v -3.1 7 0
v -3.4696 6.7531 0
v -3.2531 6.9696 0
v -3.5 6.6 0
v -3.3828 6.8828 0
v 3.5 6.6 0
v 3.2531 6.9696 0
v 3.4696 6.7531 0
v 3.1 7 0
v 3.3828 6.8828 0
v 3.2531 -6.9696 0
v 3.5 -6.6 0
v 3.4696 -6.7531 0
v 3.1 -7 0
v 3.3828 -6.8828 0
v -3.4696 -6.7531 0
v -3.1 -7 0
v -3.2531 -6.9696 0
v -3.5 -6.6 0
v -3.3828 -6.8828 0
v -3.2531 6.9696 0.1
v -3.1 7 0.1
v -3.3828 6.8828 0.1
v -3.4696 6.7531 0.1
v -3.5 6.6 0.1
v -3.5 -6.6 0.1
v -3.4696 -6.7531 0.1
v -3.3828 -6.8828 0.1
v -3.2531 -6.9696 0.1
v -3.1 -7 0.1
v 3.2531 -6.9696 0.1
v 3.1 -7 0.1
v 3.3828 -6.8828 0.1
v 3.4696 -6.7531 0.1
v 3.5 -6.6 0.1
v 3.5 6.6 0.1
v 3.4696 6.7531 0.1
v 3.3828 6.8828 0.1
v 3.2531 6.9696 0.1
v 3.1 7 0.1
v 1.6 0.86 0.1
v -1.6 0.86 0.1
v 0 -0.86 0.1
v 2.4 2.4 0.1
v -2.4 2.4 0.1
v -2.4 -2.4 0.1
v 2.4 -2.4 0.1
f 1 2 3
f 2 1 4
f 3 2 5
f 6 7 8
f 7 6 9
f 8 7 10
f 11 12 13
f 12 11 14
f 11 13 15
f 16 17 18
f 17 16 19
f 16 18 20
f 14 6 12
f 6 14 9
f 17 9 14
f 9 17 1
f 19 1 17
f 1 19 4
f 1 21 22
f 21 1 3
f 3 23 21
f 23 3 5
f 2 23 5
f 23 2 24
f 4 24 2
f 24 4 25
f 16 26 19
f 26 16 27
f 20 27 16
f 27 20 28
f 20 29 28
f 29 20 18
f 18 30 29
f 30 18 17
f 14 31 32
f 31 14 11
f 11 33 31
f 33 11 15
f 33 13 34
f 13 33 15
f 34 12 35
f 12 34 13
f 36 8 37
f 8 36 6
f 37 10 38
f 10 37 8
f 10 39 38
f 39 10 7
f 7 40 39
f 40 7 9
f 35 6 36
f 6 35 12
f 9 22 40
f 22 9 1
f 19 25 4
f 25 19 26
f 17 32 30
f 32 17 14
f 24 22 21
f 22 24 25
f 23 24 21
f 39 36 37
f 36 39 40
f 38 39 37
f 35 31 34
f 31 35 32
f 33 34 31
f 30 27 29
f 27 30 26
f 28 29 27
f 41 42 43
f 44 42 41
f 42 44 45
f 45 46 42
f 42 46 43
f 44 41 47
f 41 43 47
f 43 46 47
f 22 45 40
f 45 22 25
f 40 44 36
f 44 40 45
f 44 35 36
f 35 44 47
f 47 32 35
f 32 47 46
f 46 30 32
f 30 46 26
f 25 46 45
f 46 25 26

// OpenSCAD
// file: ../p/1-4cyli.scad
use <../lib.scad>
function ldraw_lib__1_4cyli() = [
// 0 Cylinder 0.25
// 0 Name: 1-4cyli.dat
// 0 Author: James Jessiman
// 0 !LDRAW_ORG Primitive UPDATE 2012-01
// 0 !LICENSE Licensed under CC BY 4.0 : see CAreadme.txt
// 
// 0 BFC CERTIFY CCW
  [0,"BFC","CERTIFY"],
  [0,"BFC","CCW"],
// 
// 0 !HISTORY 2002-03-23 [sbliss] Added BFC statement.
// 0 !HISTORY 2002-04-25 [PTadmin] Official Update 2002-02
// 0 !HISTORY 2007-06-22 [PTadmin] Header formatted for Contributor Agreement
// 0 !HISTORY 2008-07-01 [PTadmin] Official Update 2008-01
// 0 !HISTORY 2012-02-16 [Philo] Changed to CCW
// 0 !HISTORY 2012-03-30 [PTadmin] Official Update 2012-01
// 
// 
// 4 16 1 1 0 0.9239 1 0.3827 0.9239 0 0.3827 1 0 0
  [4,16,1,1,0,0.9239,1,0.3827,0.9239,0,0.3827,1,0,0],
// 5 24 1 0 0 1 1 0 0.9239 0 0.3827 1 0 -1
  [5,24,1,0,0,1,1,0,0.9239,0,0.3827,1,0,-1],
// 4 16 0.9239 1 0.3827 0.7071 1 0.7071 0.7071 0 0.7071 0.9239 0 0.3827
  [4,16,0.9239,1,0.3827,0.7071,1,0.7071,0.7071,0,0.7071,0.9239,0,0.3827],
// 5 24 0.9239 0 0.3827 0.9239 1 0.3827 0.7071 0 0.7071 1 0 0
  [5,24,0.9239,0,0.3827,0.9239,1,0.3827,0.7071,0,0.7071,1,0,0],
// 4 16 0.7071 1 0.7071 0.3827 1 0.9239 0.3827 0 0.9239 0.7071 0 0.7071
  [4,16,0.7071,1,0.7071,0.3827,1,0.9239,0.3827,0,0.9239,0.7071,0,0.7071],
// 5 24 0.7071 0 0.7071 0.7071 1 0.7071 0.3827 0 0.9239 0.9239 0 0.3827
  [5,24,0.7071,0,0.7071,0.7071,1,0.7071,0.3827,0,0.9239,0.9239,0,0.3827],
// 4 16 0.3827 1 0.9239 0 1 1 0 0 1 0.3827 0 0.9239
  [4,16,0.3827,1,0.9239,0,1,1,0,0,1,0.3827,0,0.9239],
// 5 24 0.3827 0 0.9239 0.3827 1 0.9239 0 0 1 0.7071 0 0.7071
  [5,24,0.3827,0,0.9239,0.3827,1,0.9239,0,0,1,0.7071,0,0.7071],
// 5 24 0 0 1 0 1 1 0.3827 0 0.9239 -1 0 1
  [5,24,0,0,1,0,1,1,0.3827,0,0.9239,-1,0,1],
];
module ldraw_lib__1_4cyli(step=0, col=false, unit=2/5, alt=false, line=0.2, solid=!$preview)
    makepoly(ldraw_lib__1_4cyli(), step=step, col=col, unit=unit, alt=alt, line=line, solid=solid);
ldraw_lib__1_4cyli(line=0.2);
// file: ../p/1-4chrd.scad
use <../lib.scad>
function ldraw_lib__1_4chrd() = [
// 0 Chord 0.25
// 0 Name: 1-4chrd.dat
// 0 Author: Max Martin Richter [MMR1988]
// 0 !LDRAW_ORG Primitive UPDATE 2023-05
// 0 !LICENSE Licensed under CC BY 4.0 : see CAreadme.txt
// 
// 0 BFC CERTIFY CCW
  [0,"BFC","CERTIFY"],
  [0,"BFC","CCW"],
// 
// 0 !HISTORY 2004-04-22 [PTadmin] Official Update 2004-02
// 0 !HISTORY 2007-10-09 [PTadmin] Header formatted for Contributor Agreement
// 0 !HISTORY 2008-07-01 [PTadmin] Official Update 2008-01
// 0 !HISTORY 2012-08-02 [MMR1988] Re-creation with PrimGen2 and Rectifier
// 0 !HISTORY 2012-08-09 [PTadmin] Official Update 2012-02
// 0 !HISTORY 2023-10-27 [OrionP] Change author to MMR1988 from hafhead
// 0 !HISTORY 2023-10-31 [OrionP] Official Update 2023-05
// 
// 4 16 0.9239 0 0.3827 0.3827 0 0.9239 0 0 1 1 0 0
  [4,16,0.9239,0,0.3827,0.3827,0,0.9239,0,0,1,1,0,0],
// 3 16 0.7071 0 0.7071 0.3827 0 0.9239 0.9239 0 0.3827
  [3,16,0.7071,0,0.7071,0.3827,0,0.9239,0.9239,0,0.3827],
];
module ldraw_lib__1_4chrd(step=0, col=false, unit=2/5, alt=false, line=0.2, solid=!$preview)
    makepoly(ldraw_lib__1_4chrd(), step=step, col=col, unit=unit, alt=alt, line=line, solid=solid);
ldraw_lib__1_4chrd(line=0.2);
// main file
use <../lib.scad>
use <../p/1-4chrd.scad>
use <../p/1-4cyli.scad>
function ldraw_lib__6103027e() = [
// 0 Sticker  1.7 x  0.8 with Red Arrow Down in White Square
// 0 Name: 6103027e.dat
// 0 Author: Evert-Jan Boer [ejboer]
// 0 !LDRAW_ORG Part UPDATE 2025-03
// 0 !LICENSE Licensed under CC BY 4.0 : see CAreadme.txt
// 
// 0 BFC CERTIFY CCW
  [0,"BFC","CERTIFY"],
  [0,"BFC","CCW"],
// 
// 0 !KEYWORDS Bricklink 75095stk01, BrickOwl 496181, Rebrickable 20028, Set 75095
// 0 !KEYWORDS Star Wars, TIE Fighter, UCS
// 
// 0 !HISTORY 2025-03-30 [OrionP] Official Update 2025-03
// 
// 1 16 -7.75 0 16.5 0 0 -1 0 -1 0 1 0 0 1-4chrd.dat
  [1,16,-7.75,0,16.5,0,0,-1,0,-1,0,1,0,0, ldraw_lib__1_4chrd()],
// 1 16 7.75 0 16.5 1 0 0 0 -1 0 0 0 1 1-4chrd.dat
  [1,16,7.75,0,16.5,1,0,0,0,-1,0,0,0,1, ldraw_lib__1_4chrd()],
// 1 16 7.75 0 -16.5 0 0 1 0 -1 0 -1 0 0 1-4chrd.dat
  [1,16,7.75,0,-16.5,0,0,1,0,-1,0,-1,0,0, ldraw_lib__1_4chrd()],
// 1 16 -7.75 0 -16.5 -1 0 0 0 -1 0 0 0 -1 1-4chrd.dat
  [1,16,-7.75,0,-16.5,-1,0,0,0,-1,0,0,0,-1, ldraw_lib__1_4chrd()],
// 4 16 8.75 0 16.5 8.75 0 -16.5 7.75 0 -17.5 7.75 0 17.5
  [4,16,8.75,0,16.5,8.75,0,-16.5,7.75,0,-17.5,7.75,0,17.5],
// 4 16 -7.75 0 17.5 7.75 0 17.5 7.75 0 -17.5 -7.75 0 -17.5
  [4,16,-7.75,0,17.5,7.75,0,17.5,7.75,0,-17.5,-7.75,0,-17.5],
// 4 16 -7.75 0 17.5 -7.75 0 -17.5 -8.75 0 -16.5 -8.75 0 16.5
  [4,16,-7.75,0,17.5,-7.75,0,-17.5,-8.75,0,-16.5,-8.75,0,16.5],
// 
// 1 16 -7.75 -.25 16.5 0 0 -1 0 .25 0 1 0 0 1-4cyli.dat
  [1,16,-7.75,-.25,16.5,0,0,-1,0,.25,0,1,0,0, ldraw_lib__1_4cyli()],
// 1 16 -7.75 -.25 -16.5 -1 0 0 0 .25 0 0 0 -1 1-4cyli.dat
  [1,16,-7.75,-.25,-16.5,-1,0,0,0,.25,0,0,0,-1, ldraw_lib__1_4cyli()],
// 1 16 7.75 -.25 -16.5 0 0 1 0 .25 0 -1 0 0 1-4cyli.dat
  [1,16,7.75,-.25,-16.5,0,0,1,0,.25,0,-1,0,0, ldraw_lib__1_4cyli()],
// 1 16 7.75 -.25 16.5 1 0 0 0 .25 0 0 0 1 1-4cyli.dat
  [1,16,7.75,-.25,16.5,1,0,0,0,.25,0,0,0,1, ldraw_lib__1_4cyli()],
// 4 16 8.75 -.25 16.5 8.75 -.25 -16.5 8.75 0 -16.5 8.75 0 16.5
  [4,16,8.75,-.25,16.5,8.75,-.25,-16.5,8.75,0,-16.5,8.75,0,16.5],
// 4 16 -7.75 -.25 17.5 7.75 -.25 17.5 7.75 0 17.5 -7.75 0 17.5
  [4,16,-7.75,-.25,17.5,7.75,-.25,17.5,7.75,0,17.5,-7.75,0,17.5],
// 4 16 -8.75 -.25 -16.5 -8.75 -.25 16.5 -8.75 0 16.5 -8.75 0 -16.5
  [4,16,-8.75,-.25,-16.5,-8.75,-.25,16.5,-8.75,0,16.5,-8.75,0,-16.5],
// 4 16 7.75 -.25 -17.5 -7.75 -.25 -17.5 -7.75 0 -17.5 7.75 0 -17.5
  [4,16,7.75,-.25,-17.5,-7.75,-.25,-17.5,-7.75,0,-17.5,7.75,0,-17.5],
// 
// 1 71 -7.75 -.25 16.5 0 0 -1 0 1 0 1 0 0 1-4chrd.dat
  [1,71,-7.75,-.25,16.5,0,0,-1,0,1,0,1,0,0, ldraw_lib__1_4chrd()],
// 1 71 7.75 -.25 16.5 1 0 0 0 1 0 0 0 1 1-4chrd.dat
  [1,71,7.75,-.25,16.5,1,0,0,0,1,0,0,0,1, ldraw_lib__1_4chrd()],
// 1 71 7.75 -.25 -16.5 0 0 1 0 1 0 -1 0 0 1-4chrd.dat
  [1,71,7.75,-.25,-16.5,0,0,1,0,1,0,-1,0,0, ldraw_lib__1_4chrd()],
// 1 71 -7.75 -.25 -16.5 -1 0 0 0 1 0 0 0 -1 1-4chrd.dat
  [1,71,-7.75,-.25,-16.5,-1,0,0,0,1,0,0,0,-1, ldraw_lib__1_4chrd()],
// 3 4 4 -.25 2.15 -4 -.25 2.15 0 -.25 -2.15
  [3,4,4,-.25,2.15,-4,-.25,2.15,0,-.25,-2.15],
// 4 15 -6 -.25 6 -4 -.25 2.15 4 -.25 2.15 6 -.25 6
  [4,15,-6,-.25,6,-4,-.25,2.15,4,-.25,2.15,6,-.25,6],
// 3 15 -6 -.25 6 -6 -.25 -6 -4 -.25 2.15
  [3,15,-6,-.25,6,-6,-.25,-6,-4,-.25,2.15],
// 3 15 -4 -.25 2.15 -6 -.25 -6 0 -.25 -2.15
  [3,15,-4,-.25,2.15,-6,-.25,-6,0,-.25,-2.15],
// 3 15 6 -.25 6 4 -.25 2.15 6 -.25 -6
  [3,15,6,-.25,6,4,-.25,2.15,6,-.25,-6],
// 3 15 4 -.25 2.15 0 -.25 -2.15 6 -.25 -6
  [3,15,4,-.25,2.15,0,-.25,-2.15,6,-.25,-6],
// 3 15 0 -.25 -2.15 -6 -.25 -6 6 -.25 -6
  [3,15,0,-.25,-2.15,-6,-.25,-6,6,-.25,-6],
// 4 71 -7.75 -.25 17.5 -8.75 -.25 16.5 -6 -.25 6 7.75 -.25 17.5
  [4,71,-7.75,-.25,17.5,-8.75,-.25,16.5,-6,-.25,6,7.75,-.25,17.5],
// 4 71 7.75 -.25 17.5 -6 -.25 6 6 -.25 6 8.75 -.25 16.5
  [4,71,7.75,-.25,17.5,-6,-.25,6,6,-.25,6,8.75,-.25,16.5],
// 4 71 8.75 -.25 -16.5 8.75 -.25 16.5 6 -.25 6 6 -.25 -6
  [4,71,8.75,-.25,-16.5,8.75,-.25,16.5,6,-.25,6,6,-.25,-6],
// 4 71 7.75 -.25 -17.5 8.75 -.25 -16.5 6 -.25 -6 -6 -.25 -6
  [4,71,7.75,-.25,-17.5,8.75,-.25,-16.5,6,-.25,-6,-6,-.25,-6],
// 4 71 -7.75 -.25 -17.5 7.75 -.25 -17.5 -6 -.25 -6 -8.75 -.25 -16.5
  [4,71,-7.75,-.25,-17.5,7.75,-.25,-17.5,-6,-.25,-6,-8.75,-.25,-16.5],
// 4 71 -8.75 -.25 16.5 -8.75 -.25 -16.5 -6 -.25 -6 -6 -.25 6
  [4,71,-8.75,-.25,16.5,-8.75,-.25,-16.5,-6,-.25,-6,-6,-.25,6],
];
module ldraw_lib__6103027e(step=0, col=false, unit=2/5, alt=false, line=0.2, solid=!$preview)
    makepoly(ldraw_lib__6103027e(), step=step, col=col, unit=unit, alt=alt, line=line, solid=solid);
ldraw_lib__6103027e(line=0.2);
